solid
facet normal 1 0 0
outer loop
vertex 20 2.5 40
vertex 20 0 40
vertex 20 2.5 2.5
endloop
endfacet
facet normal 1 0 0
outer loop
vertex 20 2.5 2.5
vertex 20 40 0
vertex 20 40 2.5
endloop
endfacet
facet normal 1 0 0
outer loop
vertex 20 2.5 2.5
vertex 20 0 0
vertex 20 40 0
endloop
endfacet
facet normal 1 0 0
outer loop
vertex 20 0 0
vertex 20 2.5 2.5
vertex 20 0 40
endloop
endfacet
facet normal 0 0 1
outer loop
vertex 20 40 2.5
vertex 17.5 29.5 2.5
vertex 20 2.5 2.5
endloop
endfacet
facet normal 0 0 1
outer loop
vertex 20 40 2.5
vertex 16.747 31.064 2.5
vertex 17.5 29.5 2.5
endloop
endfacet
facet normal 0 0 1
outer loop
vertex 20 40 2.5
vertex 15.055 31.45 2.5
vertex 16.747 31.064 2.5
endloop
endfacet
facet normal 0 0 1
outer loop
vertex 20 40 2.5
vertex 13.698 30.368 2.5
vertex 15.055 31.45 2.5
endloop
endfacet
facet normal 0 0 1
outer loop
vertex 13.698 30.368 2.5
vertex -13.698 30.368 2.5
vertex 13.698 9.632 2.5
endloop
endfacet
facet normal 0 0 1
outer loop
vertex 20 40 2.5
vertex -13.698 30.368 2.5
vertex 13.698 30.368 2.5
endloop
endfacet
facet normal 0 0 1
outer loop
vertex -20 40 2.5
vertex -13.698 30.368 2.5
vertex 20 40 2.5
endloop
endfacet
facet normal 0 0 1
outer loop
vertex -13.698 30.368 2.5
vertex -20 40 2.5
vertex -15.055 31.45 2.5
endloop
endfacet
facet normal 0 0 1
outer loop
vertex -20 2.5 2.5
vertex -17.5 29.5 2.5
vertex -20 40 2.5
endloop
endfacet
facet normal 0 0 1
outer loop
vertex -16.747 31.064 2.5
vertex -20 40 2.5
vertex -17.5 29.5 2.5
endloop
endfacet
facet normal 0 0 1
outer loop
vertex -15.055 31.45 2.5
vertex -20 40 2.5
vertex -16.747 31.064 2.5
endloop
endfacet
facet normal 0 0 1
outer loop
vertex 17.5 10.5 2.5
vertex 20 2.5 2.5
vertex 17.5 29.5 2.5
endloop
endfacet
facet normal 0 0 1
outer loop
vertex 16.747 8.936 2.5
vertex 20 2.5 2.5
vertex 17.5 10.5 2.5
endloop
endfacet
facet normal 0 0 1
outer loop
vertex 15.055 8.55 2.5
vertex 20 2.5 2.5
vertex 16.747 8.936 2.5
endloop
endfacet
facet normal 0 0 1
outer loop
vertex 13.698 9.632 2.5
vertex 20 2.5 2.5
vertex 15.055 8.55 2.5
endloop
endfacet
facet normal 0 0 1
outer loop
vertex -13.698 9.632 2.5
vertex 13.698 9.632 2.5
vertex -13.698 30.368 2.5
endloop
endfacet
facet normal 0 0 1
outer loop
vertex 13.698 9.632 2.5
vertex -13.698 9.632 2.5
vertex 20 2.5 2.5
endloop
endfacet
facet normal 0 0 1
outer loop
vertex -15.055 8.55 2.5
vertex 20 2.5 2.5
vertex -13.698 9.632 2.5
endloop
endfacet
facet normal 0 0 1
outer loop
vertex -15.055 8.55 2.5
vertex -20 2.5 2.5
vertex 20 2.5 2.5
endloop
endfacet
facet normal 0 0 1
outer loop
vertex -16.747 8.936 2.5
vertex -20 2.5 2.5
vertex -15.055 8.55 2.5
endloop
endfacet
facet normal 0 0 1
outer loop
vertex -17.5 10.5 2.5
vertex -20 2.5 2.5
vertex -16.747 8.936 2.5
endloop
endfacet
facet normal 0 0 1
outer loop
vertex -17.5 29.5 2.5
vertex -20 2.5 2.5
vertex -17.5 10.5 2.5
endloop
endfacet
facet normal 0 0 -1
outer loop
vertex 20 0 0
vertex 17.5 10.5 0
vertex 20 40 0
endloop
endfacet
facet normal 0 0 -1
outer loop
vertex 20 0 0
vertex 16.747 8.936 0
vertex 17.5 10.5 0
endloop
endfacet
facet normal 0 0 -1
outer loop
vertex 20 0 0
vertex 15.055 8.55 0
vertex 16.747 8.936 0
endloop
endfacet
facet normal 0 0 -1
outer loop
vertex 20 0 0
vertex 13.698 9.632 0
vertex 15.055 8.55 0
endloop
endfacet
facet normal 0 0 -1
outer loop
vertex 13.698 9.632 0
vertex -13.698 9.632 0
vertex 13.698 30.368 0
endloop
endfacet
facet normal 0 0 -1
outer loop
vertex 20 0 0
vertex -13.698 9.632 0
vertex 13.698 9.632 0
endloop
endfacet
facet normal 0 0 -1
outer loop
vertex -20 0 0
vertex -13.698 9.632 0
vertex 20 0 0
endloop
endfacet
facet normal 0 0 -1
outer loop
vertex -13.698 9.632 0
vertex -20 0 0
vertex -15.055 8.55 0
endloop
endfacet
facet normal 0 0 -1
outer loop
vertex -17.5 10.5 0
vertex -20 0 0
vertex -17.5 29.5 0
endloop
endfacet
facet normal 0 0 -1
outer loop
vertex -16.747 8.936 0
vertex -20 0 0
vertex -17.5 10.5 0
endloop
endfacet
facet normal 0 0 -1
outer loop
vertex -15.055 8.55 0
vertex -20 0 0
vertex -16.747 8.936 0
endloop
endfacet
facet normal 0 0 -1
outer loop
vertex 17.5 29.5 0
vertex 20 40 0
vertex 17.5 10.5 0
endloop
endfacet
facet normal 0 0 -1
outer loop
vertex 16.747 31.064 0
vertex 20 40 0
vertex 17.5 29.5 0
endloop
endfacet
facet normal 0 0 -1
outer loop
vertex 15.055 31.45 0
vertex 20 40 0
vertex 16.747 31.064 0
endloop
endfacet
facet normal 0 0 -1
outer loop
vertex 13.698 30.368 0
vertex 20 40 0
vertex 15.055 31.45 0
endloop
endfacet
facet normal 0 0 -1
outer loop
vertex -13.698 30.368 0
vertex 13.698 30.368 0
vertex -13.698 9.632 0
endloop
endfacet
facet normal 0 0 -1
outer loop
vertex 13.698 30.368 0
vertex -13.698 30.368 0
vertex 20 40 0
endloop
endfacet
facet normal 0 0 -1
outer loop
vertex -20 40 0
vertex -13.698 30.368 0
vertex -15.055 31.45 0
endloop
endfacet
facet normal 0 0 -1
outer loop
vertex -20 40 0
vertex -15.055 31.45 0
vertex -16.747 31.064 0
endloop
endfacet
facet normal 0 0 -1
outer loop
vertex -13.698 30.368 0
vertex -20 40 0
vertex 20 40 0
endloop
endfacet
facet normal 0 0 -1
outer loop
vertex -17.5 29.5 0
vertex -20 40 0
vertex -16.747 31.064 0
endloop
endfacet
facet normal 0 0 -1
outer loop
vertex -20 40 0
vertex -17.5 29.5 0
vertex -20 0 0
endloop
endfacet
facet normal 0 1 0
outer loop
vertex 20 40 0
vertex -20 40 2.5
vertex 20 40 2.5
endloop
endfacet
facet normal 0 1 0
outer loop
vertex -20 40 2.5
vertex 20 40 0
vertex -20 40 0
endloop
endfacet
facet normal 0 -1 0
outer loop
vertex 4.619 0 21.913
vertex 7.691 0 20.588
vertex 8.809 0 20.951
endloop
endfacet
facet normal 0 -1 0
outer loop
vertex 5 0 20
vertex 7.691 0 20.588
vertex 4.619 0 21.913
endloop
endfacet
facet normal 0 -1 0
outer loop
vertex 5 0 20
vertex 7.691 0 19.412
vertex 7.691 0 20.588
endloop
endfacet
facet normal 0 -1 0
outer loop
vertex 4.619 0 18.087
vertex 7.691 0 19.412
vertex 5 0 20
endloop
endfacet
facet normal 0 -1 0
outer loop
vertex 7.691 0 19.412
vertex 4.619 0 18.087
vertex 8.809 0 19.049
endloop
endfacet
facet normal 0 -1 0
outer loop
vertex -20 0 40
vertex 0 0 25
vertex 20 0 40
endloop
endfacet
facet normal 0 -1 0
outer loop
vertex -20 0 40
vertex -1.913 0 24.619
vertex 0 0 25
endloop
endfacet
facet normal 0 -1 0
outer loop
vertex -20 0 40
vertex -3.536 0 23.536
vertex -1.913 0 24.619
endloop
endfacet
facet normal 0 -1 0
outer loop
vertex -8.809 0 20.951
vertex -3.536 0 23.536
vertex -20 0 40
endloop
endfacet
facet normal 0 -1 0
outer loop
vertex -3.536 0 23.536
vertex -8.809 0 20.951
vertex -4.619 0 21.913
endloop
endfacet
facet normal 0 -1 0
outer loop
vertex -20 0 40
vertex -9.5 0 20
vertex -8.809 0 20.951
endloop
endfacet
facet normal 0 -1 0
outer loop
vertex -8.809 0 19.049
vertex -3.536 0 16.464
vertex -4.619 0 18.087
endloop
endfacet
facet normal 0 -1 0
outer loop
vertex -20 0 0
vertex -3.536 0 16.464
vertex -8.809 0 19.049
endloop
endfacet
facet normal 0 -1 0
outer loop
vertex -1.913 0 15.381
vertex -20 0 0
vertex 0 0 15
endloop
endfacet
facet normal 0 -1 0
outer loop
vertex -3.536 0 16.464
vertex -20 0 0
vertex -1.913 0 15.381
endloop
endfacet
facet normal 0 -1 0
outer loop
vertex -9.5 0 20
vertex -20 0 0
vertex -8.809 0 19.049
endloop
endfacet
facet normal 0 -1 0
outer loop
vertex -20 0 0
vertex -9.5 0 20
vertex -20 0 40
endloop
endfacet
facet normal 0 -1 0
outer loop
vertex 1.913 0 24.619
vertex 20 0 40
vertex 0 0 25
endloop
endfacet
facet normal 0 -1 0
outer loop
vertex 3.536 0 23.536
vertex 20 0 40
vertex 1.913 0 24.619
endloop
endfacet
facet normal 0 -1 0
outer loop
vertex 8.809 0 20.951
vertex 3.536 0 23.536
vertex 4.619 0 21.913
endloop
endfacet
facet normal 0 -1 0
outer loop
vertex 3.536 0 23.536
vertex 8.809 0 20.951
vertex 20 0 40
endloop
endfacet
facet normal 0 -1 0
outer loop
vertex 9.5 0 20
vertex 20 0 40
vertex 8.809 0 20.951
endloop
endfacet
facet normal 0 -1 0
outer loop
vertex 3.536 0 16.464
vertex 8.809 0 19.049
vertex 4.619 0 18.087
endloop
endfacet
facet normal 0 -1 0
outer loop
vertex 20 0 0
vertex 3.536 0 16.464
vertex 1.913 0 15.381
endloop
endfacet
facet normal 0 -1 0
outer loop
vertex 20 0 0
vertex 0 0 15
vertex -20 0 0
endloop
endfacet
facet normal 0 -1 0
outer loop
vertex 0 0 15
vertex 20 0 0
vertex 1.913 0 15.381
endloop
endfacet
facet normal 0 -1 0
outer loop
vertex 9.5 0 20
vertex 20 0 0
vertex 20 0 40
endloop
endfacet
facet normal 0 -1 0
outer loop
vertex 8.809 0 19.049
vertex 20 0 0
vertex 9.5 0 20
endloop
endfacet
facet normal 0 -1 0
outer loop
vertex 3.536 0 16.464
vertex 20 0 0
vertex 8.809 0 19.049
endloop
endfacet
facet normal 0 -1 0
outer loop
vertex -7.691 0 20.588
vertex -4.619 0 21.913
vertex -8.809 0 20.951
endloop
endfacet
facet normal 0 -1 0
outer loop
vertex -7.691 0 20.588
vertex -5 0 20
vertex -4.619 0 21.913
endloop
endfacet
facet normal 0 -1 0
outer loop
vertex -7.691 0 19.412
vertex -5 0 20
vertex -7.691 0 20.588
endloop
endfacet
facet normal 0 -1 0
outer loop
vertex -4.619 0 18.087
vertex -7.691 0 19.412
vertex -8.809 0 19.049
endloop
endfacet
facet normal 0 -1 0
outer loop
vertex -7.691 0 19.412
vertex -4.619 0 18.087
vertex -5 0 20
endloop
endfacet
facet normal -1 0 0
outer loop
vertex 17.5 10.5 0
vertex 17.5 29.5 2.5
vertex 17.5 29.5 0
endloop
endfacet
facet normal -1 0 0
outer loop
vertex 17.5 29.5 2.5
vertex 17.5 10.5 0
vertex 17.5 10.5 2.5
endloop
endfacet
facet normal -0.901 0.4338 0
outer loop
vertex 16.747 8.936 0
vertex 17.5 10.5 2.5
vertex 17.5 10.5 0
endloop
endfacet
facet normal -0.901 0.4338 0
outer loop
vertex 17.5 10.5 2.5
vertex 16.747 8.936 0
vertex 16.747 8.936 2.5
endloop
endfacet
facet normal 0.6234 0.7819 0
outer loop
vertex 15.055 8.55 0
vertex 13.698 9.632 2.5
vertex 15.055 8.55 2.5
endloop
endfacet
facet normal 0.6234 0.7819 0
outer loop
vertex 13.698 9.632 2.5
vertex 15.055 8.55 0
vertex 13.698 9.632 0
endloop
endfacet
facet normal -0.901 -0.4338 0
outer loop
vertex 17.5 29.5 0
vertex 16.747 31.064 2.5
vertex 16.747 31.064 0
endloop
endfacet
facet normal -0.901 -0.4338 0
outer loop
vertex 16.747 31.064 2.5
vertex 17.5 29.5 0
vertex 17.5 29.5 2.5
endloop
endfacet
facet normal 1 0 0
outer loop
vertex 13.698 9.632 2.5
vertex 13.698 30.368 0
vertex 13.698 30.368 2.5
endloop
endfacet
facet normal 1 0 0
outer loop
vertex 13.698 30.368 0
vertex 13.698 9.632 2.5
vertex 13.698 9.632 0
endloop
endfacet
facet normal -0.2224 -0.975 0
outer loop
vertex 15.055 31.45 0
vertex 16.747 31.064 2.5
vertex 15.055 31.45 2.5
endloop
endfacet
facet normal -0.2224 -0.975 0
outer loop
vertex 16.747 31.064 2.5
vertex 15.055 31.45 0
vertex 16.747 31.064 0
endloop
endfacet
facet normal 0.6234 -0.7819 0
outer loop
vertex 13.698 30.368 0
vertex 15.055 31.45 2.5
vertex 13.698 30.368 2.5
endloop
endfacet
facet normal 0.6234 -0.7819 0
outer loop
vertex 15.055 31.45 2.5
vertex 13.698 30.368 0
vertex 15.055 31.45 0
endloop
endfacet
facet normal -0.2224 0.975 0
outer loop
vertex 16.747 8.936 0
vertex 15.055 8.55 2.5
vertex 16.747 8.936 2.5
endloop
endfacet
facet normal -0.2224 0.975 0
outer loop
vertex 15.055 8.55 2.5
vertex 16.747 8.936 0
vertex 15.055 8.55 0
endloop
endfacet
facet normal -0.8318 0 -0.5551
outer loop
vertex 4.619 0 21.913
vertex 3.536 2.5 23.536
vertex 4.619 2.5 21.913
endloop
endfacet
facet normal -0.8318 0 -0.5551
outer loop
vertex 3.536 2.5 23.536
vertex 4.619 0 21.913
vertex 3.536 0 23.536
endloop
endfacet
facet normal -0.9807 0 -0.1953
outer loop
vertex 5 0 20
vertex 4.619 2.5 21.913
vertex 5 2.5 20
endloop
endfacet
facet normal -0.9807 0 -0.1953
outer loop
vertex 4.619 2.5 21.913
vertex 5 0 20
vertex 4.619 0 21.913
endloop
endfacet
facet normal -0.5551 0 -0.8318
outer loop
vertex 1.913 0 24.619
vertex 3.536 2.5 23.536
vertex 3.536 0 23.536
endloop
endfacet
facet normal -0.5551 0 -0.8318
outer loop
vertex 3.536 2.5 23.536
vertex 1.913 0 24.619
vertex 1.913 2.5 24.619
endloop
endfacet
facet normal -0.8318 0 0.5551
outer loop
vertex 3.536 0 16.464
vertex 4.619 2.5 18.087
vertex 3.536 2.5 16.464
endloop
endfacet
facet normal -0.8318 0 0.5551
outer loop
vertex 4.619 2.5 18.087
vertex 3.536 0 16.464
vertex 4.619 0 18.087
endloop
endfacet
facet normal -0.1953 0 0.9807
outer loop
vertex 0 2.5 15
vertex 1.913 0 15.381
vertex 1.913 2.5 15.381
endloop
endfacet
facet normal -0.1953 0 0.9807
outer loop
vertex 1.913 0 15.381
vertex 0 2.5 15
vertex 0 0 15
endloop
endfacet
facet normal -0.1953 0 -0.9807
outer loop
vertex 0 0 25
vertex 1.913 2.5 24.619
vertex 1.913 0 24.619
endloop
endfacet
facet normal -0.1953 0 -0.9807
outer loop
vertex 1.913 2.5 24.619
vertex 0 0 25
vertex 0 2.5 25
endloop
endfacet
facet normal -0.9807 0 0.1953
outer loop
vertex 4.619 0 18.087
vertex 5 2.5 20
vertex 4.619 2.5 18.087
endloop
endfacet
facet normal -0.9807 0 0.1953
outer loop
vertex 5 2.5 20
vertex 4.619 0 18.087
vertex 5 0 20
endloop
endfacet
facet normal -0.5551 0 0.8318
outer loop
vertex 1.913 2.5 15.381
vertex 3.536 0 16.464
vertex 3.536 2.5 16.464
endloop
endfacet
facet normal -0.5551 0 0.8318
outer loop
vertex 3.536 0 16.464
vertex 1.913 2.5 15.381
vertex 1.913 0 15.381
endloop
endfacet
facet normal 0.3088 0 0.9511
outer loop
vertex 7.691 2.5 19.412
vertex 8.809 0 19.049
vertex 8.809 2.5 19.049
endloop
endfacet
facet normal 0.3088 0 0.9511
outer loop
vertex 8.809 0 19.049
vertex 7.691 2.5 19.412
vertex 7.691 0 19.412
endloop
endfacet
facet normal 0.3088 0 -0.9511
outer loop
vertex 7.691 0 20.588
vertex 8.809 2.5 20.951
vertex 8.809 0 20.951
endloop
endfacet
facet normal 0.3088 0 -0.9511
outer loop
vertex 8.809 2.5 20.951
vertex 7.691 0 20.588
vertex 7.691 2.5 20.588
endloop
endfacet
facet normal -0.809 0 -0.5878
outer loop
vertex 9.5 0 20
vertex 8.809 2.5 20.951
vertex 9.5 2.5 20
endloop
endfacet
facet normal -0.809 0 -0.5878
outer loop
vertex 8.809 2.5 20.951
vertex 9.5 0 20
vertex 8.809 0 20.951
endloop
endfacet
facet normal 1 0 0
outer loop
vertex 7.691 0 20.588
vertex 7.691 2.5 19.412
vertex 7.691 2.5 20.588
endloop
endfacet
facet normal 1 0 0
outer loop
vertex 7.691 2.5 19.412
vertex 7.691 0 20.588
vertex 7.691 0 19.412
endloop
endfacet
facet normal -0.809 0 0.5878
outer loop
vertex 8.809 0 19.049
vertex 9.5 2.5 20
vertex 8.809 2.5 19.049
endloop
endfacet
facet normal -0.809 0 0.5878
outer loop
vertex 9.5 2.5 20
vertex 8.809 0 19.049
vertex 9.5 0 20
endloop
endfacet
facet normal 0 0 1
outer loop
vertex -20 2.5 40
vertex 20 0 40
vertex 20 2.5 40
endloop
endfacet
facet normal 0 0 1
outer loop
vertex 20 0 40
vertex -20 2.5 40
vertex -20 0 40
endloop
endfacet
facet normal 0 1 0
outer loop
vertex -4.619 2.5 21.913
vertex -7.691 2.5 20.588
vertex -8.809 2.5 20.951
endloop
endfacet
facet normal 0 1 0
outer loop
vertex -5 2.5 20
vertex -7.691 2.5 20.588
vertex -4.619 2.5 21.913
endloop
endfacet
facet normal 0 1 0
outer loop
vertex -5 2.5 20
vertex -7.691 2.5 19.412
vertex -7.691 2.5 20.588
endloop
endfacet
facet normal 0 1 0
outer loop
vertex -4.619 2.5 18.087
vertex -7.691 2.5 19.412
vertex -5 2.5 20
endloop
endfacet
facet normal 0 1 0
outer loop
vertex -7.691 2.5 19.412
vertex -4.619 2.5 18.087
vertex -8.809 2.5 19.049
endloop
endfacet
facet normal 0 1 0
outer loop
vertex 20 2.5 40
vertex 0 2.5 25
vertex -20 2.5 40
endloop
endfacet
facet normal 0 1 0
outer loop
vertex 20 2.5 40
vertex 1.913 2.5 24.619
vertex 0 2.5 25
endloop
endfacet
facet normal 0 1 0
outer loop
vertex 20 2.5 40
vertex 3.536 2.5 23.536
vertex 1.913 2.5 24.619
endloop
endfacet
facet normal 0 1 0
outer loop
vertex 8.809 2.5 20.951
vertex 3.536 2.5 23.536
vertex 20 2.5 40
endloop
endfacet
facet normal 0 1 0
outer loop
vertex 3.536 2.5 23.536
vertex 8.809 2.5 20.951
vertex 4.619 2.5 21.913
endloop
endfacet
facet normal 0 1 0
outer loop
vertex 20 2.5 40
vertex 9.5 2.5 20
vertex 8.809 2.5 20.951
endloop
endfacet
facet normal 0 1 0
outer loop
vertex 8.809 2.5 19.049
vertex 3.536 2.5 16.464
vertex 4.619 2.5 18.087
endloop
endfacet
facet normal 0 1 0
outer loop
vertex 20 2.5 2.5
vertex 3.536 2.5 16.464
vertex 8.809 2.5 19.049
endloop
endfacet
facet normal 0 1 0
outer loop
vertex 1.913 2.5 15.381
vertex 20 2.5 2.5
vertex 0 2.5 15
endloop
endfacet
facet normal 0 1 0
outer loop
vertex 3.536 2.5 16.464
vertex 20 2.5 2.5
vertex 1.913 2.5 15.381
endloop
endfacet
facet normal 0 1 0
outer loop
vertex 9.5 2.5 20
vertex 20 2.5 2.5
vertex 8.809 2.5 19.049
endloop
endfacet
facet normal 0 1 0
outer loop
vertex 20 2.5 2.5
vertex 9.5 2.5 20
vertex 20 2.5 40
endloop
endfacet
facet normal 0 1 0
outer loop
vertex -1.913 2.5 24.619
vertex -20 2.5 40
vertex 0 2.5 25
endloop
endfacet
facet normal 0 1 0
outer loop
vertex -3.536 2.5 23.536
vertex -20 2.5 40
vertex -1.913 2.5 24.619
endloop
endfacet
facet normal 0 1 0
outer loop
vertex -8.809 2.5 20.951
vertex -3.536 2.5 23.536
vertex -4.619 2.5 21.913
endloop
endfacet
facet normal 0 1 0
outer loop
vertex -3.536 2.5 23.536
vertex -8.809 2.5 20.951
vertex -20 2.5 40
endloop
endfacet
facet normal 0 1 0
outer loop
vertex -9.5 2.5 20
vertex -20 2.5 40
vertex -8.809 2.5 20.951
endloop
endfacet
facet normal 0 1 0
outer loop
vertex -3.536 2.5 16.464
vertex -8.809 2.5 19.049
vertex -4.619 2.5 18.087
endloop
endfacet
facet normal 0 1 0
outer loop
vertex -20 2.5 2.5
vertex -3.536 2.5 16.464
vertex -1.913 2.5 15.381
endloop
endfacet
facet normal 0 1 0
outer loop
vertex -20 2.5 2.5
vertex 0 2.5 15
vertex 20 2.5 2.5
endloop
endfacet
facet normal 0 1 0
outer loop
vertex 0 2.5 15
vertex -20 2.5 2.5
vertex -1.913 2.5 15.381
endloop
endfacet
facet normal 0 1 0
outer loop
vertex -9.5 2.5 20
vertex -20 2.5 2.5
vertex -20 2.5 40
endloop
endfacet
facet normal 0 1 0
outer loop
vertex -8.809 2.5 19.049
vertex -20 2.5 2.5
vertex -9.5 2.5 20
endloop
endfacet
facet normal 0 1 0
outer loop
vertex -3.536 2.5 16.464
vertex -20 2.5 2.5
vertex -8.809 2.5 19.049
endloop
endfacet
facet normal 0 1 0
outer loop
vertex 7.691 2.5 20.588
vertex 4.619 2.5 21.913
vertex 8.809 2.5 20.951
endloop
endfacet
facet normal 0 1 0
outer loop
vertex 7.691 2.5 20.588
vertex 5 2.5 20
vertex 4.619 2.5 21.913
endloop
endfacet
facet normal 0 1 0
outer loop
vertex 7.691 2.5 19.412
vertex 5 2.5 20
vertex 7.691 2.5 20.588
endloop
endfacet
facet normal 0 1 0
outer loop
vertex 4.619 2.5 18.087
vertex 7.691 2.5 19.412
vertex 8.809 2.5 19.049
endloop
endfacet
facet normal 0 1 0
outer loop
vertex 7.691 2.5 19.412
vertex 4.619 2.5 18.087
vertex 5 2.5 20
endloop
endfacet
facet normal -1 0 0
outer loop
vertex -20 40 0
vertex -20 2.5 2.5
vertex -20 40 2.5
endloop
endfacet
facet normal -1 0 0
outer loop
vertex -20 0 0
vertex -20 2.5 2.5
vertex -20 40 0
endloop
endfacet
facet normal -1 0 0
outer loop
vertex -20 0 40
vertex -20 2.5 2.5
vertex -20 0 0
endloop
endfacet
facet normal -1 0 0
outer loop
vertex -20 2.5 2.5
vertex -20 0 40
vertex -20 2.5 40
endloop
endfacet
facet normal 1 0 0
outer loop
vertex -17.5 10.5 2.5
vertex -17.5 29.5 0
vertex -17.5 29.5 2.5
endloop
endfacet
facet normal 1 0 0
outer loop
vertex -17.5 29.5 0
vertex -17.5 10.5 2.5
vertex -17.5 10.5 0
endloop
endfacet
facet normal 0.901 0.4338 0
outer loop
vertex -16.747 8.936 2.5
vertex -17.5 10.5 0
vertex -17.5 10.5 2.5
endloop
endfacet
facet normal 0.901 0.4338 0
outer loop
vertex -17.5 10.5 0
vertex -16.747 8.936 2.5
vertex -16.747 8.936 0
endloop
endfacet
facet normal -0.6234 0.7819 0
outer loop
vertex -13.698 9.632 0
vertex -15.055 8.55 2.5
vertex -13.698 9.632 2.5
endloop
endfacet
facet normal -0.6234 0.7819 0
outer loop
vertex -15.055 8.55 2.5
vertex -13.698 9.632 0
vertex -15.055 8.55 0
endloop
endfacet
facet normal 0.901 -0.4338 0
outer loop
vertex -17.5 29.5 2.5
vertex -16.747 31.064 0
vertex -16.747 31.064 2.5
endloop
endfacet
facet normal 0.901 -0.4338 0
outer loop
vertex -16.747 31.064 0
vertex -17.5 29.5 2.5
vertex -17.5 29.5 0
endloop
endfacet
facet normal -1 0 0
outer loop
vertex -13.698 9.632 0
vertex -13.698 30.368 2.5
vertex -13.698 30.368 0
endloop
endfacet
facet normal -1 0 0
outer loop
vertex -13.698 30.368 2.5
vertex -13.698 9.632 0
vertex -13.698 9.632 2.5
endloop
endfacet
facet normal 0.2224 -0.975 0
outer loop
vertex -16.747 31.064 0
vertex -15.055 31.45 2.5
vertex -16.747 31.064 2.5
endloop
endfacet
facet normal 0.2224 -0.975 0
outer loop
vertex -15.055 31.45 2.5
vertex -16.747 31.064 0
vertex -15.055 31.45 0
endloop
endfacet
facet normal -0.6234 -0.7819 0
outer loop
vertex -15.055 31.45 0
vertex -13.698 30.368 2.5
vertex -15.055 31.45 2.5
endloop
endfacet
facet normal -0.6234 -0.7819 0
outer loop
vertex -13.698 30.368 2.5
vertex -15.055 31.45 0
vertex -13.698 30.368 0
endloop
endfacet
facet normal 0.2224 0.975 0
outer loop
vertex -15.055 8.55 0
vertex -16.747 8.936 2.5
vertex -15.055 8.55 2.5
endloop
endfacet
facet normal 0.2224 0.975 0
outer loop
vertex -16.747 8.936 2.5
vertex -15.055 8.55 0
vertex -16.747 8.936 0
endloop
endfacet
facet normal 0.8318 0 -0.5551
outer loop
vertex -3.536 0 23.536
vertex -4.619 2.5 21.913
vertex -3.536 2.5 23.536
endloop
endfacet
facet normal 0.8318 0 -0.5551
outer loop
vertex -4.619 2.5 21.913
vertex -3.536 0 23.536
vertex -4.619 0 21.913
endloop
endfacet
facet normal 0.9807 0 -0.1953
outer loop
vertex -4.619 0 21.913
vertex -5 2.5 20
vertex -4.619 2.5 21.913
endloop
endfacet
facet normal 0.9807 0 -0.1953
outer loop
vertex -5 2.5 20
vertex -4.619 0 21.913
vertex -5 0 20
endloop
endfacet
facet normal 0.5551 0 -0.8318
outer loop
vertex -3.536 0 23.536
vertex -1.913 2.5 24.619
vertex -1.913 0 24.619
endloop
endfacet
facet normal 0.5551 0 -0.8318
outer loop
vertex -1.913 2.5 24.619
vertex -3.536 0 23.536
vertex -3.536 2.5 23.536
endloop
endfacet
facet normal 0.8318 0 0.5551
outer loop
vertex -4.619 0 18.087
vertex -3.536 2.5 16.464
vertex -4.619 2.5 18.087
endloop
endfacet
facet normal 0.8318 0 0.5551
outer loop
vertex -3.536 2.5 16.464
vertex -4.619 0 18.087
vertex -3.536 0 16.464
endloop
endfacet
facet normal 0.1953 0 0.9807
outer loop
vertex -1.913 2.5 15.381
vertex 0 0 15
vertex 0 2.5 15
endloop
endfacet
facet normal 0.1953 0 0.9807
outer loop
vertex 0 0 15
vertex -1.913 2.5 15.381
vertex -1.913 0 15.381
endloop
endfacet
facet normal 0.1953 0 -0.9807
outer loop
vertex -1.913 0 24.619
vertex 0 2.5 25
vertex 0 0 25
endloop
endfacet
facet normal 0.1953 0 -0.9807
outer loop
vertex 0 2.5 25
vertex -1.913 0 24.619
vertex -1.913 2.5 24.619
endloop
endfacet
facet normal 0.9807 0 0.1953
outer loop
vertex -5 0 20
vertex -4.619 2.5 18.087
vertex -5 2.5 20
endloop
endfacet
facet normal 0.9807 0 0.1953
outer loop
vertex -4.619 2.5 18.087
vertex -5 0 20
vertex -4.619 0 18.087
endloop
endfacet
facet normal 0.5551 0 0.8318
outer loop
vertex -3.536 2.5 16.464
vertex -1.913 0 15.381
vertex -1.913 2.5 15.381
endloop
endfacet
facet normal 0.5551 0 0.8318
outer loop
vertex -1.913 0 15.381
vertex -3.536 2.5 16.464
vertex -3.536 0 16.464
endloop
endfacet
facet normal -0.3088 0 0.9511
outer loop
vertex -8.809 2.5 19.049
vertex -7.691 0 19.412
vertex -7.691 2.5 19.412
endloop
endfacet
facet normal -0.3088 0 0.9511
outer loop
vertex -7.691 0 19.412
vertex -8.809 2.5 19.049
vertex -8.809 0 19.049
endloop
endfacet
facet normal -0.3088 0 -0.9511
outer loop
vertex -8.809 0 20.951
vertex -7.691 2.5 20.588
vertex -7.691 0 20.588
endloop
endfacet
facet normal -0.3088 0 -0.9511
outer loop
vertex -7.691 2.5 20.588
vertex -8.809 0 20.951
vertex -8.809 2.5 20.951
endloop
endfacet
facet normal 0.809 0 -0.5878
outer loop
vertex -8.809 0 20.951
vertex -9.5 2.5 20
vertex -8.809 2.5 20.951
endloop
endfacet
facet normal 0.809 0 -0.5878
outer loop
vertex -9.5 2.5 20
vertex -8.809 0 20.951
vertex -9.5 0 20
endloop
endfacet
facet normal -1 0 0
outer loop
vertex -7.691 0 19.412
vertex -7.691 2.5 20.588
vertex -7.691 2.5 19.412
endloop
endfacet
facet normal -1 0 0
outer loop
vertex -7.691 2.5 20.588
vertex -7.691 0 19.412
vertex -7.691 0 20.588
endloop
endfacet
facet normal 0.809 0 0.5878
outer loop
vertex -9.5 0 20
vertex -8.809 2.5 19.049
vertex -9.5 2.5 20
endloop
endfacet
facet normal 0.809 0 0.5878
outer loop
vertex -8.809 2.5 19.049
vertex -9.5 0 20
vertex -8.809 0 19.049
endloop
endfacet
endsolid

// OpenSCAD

//Height support
Height_support=40;

//thickness;
Thickness = 2.5;//[1:10]

//Diameter of the center hole motor
Motor_center_hole_diameter=10;

//Diameter of the motor mount holes
Motor_mount_hole_diameter=2;

//Diameter of the holes for fixing the equerre
Motor_mount_hole_spacing=15;

//use renforcement
Renforcement = "yes"; // [yes,no]

//Diameter of the slot holes for fixing the equerre
Base_slot=4;


//ignore variable values
H=Height_support / 1;
E=Thickness / 1; 
D=Motor_center_hole_diameter/1;
d=Motor_mount_hole_diameter/1;
T=Base_slot/1; 
M=Motor_mount_hole_spacing/1; 

module equerre(){
		union(){
			//base
			difference(){
				cube([H/2,H,E]);
				union(){
					//Oblon
			      hull(){ 
			        translate([H/2-(E+T/2),E+T+H/10,-E]) cylinder(r=T/2, h=3*E);
			        translate([H/2-(E+T/2),H-E-T-H/10,-E])cylinder(r=T/2, h=3*E);
					}
				}

			}
if(Renforcement == "yes"){
		translate([H/2-E,E,E]) polyhedron(
			points=[[0,0,0],[E,0,0],[E,0,E],[0,0,E],[0,E,0],[E,E,0]],
			faces=[[0,1,2],[0,2,3],[0,1,5],[0,5,4],[3,2,5],[1,2,5],[5,3,4],[0,4,3]
					]
				);
	}
				 
			//haut
			difference(){
				cube([H/2,E,H]);
				rotate([90,0,0]){
					union(){
						//trou axe moteur
						translate([0,H/2,-2*E])cylinder(r=D/2,h=4*E);
						//trou fixation moteur
						translate([M/2+d/2,H/2,-2*E])cylinder(r=d/2,h=4*E);
					}
				}
			}
		}
}

	union(){
		equerre();
		mirror([1,0,0])equerre();
	}


